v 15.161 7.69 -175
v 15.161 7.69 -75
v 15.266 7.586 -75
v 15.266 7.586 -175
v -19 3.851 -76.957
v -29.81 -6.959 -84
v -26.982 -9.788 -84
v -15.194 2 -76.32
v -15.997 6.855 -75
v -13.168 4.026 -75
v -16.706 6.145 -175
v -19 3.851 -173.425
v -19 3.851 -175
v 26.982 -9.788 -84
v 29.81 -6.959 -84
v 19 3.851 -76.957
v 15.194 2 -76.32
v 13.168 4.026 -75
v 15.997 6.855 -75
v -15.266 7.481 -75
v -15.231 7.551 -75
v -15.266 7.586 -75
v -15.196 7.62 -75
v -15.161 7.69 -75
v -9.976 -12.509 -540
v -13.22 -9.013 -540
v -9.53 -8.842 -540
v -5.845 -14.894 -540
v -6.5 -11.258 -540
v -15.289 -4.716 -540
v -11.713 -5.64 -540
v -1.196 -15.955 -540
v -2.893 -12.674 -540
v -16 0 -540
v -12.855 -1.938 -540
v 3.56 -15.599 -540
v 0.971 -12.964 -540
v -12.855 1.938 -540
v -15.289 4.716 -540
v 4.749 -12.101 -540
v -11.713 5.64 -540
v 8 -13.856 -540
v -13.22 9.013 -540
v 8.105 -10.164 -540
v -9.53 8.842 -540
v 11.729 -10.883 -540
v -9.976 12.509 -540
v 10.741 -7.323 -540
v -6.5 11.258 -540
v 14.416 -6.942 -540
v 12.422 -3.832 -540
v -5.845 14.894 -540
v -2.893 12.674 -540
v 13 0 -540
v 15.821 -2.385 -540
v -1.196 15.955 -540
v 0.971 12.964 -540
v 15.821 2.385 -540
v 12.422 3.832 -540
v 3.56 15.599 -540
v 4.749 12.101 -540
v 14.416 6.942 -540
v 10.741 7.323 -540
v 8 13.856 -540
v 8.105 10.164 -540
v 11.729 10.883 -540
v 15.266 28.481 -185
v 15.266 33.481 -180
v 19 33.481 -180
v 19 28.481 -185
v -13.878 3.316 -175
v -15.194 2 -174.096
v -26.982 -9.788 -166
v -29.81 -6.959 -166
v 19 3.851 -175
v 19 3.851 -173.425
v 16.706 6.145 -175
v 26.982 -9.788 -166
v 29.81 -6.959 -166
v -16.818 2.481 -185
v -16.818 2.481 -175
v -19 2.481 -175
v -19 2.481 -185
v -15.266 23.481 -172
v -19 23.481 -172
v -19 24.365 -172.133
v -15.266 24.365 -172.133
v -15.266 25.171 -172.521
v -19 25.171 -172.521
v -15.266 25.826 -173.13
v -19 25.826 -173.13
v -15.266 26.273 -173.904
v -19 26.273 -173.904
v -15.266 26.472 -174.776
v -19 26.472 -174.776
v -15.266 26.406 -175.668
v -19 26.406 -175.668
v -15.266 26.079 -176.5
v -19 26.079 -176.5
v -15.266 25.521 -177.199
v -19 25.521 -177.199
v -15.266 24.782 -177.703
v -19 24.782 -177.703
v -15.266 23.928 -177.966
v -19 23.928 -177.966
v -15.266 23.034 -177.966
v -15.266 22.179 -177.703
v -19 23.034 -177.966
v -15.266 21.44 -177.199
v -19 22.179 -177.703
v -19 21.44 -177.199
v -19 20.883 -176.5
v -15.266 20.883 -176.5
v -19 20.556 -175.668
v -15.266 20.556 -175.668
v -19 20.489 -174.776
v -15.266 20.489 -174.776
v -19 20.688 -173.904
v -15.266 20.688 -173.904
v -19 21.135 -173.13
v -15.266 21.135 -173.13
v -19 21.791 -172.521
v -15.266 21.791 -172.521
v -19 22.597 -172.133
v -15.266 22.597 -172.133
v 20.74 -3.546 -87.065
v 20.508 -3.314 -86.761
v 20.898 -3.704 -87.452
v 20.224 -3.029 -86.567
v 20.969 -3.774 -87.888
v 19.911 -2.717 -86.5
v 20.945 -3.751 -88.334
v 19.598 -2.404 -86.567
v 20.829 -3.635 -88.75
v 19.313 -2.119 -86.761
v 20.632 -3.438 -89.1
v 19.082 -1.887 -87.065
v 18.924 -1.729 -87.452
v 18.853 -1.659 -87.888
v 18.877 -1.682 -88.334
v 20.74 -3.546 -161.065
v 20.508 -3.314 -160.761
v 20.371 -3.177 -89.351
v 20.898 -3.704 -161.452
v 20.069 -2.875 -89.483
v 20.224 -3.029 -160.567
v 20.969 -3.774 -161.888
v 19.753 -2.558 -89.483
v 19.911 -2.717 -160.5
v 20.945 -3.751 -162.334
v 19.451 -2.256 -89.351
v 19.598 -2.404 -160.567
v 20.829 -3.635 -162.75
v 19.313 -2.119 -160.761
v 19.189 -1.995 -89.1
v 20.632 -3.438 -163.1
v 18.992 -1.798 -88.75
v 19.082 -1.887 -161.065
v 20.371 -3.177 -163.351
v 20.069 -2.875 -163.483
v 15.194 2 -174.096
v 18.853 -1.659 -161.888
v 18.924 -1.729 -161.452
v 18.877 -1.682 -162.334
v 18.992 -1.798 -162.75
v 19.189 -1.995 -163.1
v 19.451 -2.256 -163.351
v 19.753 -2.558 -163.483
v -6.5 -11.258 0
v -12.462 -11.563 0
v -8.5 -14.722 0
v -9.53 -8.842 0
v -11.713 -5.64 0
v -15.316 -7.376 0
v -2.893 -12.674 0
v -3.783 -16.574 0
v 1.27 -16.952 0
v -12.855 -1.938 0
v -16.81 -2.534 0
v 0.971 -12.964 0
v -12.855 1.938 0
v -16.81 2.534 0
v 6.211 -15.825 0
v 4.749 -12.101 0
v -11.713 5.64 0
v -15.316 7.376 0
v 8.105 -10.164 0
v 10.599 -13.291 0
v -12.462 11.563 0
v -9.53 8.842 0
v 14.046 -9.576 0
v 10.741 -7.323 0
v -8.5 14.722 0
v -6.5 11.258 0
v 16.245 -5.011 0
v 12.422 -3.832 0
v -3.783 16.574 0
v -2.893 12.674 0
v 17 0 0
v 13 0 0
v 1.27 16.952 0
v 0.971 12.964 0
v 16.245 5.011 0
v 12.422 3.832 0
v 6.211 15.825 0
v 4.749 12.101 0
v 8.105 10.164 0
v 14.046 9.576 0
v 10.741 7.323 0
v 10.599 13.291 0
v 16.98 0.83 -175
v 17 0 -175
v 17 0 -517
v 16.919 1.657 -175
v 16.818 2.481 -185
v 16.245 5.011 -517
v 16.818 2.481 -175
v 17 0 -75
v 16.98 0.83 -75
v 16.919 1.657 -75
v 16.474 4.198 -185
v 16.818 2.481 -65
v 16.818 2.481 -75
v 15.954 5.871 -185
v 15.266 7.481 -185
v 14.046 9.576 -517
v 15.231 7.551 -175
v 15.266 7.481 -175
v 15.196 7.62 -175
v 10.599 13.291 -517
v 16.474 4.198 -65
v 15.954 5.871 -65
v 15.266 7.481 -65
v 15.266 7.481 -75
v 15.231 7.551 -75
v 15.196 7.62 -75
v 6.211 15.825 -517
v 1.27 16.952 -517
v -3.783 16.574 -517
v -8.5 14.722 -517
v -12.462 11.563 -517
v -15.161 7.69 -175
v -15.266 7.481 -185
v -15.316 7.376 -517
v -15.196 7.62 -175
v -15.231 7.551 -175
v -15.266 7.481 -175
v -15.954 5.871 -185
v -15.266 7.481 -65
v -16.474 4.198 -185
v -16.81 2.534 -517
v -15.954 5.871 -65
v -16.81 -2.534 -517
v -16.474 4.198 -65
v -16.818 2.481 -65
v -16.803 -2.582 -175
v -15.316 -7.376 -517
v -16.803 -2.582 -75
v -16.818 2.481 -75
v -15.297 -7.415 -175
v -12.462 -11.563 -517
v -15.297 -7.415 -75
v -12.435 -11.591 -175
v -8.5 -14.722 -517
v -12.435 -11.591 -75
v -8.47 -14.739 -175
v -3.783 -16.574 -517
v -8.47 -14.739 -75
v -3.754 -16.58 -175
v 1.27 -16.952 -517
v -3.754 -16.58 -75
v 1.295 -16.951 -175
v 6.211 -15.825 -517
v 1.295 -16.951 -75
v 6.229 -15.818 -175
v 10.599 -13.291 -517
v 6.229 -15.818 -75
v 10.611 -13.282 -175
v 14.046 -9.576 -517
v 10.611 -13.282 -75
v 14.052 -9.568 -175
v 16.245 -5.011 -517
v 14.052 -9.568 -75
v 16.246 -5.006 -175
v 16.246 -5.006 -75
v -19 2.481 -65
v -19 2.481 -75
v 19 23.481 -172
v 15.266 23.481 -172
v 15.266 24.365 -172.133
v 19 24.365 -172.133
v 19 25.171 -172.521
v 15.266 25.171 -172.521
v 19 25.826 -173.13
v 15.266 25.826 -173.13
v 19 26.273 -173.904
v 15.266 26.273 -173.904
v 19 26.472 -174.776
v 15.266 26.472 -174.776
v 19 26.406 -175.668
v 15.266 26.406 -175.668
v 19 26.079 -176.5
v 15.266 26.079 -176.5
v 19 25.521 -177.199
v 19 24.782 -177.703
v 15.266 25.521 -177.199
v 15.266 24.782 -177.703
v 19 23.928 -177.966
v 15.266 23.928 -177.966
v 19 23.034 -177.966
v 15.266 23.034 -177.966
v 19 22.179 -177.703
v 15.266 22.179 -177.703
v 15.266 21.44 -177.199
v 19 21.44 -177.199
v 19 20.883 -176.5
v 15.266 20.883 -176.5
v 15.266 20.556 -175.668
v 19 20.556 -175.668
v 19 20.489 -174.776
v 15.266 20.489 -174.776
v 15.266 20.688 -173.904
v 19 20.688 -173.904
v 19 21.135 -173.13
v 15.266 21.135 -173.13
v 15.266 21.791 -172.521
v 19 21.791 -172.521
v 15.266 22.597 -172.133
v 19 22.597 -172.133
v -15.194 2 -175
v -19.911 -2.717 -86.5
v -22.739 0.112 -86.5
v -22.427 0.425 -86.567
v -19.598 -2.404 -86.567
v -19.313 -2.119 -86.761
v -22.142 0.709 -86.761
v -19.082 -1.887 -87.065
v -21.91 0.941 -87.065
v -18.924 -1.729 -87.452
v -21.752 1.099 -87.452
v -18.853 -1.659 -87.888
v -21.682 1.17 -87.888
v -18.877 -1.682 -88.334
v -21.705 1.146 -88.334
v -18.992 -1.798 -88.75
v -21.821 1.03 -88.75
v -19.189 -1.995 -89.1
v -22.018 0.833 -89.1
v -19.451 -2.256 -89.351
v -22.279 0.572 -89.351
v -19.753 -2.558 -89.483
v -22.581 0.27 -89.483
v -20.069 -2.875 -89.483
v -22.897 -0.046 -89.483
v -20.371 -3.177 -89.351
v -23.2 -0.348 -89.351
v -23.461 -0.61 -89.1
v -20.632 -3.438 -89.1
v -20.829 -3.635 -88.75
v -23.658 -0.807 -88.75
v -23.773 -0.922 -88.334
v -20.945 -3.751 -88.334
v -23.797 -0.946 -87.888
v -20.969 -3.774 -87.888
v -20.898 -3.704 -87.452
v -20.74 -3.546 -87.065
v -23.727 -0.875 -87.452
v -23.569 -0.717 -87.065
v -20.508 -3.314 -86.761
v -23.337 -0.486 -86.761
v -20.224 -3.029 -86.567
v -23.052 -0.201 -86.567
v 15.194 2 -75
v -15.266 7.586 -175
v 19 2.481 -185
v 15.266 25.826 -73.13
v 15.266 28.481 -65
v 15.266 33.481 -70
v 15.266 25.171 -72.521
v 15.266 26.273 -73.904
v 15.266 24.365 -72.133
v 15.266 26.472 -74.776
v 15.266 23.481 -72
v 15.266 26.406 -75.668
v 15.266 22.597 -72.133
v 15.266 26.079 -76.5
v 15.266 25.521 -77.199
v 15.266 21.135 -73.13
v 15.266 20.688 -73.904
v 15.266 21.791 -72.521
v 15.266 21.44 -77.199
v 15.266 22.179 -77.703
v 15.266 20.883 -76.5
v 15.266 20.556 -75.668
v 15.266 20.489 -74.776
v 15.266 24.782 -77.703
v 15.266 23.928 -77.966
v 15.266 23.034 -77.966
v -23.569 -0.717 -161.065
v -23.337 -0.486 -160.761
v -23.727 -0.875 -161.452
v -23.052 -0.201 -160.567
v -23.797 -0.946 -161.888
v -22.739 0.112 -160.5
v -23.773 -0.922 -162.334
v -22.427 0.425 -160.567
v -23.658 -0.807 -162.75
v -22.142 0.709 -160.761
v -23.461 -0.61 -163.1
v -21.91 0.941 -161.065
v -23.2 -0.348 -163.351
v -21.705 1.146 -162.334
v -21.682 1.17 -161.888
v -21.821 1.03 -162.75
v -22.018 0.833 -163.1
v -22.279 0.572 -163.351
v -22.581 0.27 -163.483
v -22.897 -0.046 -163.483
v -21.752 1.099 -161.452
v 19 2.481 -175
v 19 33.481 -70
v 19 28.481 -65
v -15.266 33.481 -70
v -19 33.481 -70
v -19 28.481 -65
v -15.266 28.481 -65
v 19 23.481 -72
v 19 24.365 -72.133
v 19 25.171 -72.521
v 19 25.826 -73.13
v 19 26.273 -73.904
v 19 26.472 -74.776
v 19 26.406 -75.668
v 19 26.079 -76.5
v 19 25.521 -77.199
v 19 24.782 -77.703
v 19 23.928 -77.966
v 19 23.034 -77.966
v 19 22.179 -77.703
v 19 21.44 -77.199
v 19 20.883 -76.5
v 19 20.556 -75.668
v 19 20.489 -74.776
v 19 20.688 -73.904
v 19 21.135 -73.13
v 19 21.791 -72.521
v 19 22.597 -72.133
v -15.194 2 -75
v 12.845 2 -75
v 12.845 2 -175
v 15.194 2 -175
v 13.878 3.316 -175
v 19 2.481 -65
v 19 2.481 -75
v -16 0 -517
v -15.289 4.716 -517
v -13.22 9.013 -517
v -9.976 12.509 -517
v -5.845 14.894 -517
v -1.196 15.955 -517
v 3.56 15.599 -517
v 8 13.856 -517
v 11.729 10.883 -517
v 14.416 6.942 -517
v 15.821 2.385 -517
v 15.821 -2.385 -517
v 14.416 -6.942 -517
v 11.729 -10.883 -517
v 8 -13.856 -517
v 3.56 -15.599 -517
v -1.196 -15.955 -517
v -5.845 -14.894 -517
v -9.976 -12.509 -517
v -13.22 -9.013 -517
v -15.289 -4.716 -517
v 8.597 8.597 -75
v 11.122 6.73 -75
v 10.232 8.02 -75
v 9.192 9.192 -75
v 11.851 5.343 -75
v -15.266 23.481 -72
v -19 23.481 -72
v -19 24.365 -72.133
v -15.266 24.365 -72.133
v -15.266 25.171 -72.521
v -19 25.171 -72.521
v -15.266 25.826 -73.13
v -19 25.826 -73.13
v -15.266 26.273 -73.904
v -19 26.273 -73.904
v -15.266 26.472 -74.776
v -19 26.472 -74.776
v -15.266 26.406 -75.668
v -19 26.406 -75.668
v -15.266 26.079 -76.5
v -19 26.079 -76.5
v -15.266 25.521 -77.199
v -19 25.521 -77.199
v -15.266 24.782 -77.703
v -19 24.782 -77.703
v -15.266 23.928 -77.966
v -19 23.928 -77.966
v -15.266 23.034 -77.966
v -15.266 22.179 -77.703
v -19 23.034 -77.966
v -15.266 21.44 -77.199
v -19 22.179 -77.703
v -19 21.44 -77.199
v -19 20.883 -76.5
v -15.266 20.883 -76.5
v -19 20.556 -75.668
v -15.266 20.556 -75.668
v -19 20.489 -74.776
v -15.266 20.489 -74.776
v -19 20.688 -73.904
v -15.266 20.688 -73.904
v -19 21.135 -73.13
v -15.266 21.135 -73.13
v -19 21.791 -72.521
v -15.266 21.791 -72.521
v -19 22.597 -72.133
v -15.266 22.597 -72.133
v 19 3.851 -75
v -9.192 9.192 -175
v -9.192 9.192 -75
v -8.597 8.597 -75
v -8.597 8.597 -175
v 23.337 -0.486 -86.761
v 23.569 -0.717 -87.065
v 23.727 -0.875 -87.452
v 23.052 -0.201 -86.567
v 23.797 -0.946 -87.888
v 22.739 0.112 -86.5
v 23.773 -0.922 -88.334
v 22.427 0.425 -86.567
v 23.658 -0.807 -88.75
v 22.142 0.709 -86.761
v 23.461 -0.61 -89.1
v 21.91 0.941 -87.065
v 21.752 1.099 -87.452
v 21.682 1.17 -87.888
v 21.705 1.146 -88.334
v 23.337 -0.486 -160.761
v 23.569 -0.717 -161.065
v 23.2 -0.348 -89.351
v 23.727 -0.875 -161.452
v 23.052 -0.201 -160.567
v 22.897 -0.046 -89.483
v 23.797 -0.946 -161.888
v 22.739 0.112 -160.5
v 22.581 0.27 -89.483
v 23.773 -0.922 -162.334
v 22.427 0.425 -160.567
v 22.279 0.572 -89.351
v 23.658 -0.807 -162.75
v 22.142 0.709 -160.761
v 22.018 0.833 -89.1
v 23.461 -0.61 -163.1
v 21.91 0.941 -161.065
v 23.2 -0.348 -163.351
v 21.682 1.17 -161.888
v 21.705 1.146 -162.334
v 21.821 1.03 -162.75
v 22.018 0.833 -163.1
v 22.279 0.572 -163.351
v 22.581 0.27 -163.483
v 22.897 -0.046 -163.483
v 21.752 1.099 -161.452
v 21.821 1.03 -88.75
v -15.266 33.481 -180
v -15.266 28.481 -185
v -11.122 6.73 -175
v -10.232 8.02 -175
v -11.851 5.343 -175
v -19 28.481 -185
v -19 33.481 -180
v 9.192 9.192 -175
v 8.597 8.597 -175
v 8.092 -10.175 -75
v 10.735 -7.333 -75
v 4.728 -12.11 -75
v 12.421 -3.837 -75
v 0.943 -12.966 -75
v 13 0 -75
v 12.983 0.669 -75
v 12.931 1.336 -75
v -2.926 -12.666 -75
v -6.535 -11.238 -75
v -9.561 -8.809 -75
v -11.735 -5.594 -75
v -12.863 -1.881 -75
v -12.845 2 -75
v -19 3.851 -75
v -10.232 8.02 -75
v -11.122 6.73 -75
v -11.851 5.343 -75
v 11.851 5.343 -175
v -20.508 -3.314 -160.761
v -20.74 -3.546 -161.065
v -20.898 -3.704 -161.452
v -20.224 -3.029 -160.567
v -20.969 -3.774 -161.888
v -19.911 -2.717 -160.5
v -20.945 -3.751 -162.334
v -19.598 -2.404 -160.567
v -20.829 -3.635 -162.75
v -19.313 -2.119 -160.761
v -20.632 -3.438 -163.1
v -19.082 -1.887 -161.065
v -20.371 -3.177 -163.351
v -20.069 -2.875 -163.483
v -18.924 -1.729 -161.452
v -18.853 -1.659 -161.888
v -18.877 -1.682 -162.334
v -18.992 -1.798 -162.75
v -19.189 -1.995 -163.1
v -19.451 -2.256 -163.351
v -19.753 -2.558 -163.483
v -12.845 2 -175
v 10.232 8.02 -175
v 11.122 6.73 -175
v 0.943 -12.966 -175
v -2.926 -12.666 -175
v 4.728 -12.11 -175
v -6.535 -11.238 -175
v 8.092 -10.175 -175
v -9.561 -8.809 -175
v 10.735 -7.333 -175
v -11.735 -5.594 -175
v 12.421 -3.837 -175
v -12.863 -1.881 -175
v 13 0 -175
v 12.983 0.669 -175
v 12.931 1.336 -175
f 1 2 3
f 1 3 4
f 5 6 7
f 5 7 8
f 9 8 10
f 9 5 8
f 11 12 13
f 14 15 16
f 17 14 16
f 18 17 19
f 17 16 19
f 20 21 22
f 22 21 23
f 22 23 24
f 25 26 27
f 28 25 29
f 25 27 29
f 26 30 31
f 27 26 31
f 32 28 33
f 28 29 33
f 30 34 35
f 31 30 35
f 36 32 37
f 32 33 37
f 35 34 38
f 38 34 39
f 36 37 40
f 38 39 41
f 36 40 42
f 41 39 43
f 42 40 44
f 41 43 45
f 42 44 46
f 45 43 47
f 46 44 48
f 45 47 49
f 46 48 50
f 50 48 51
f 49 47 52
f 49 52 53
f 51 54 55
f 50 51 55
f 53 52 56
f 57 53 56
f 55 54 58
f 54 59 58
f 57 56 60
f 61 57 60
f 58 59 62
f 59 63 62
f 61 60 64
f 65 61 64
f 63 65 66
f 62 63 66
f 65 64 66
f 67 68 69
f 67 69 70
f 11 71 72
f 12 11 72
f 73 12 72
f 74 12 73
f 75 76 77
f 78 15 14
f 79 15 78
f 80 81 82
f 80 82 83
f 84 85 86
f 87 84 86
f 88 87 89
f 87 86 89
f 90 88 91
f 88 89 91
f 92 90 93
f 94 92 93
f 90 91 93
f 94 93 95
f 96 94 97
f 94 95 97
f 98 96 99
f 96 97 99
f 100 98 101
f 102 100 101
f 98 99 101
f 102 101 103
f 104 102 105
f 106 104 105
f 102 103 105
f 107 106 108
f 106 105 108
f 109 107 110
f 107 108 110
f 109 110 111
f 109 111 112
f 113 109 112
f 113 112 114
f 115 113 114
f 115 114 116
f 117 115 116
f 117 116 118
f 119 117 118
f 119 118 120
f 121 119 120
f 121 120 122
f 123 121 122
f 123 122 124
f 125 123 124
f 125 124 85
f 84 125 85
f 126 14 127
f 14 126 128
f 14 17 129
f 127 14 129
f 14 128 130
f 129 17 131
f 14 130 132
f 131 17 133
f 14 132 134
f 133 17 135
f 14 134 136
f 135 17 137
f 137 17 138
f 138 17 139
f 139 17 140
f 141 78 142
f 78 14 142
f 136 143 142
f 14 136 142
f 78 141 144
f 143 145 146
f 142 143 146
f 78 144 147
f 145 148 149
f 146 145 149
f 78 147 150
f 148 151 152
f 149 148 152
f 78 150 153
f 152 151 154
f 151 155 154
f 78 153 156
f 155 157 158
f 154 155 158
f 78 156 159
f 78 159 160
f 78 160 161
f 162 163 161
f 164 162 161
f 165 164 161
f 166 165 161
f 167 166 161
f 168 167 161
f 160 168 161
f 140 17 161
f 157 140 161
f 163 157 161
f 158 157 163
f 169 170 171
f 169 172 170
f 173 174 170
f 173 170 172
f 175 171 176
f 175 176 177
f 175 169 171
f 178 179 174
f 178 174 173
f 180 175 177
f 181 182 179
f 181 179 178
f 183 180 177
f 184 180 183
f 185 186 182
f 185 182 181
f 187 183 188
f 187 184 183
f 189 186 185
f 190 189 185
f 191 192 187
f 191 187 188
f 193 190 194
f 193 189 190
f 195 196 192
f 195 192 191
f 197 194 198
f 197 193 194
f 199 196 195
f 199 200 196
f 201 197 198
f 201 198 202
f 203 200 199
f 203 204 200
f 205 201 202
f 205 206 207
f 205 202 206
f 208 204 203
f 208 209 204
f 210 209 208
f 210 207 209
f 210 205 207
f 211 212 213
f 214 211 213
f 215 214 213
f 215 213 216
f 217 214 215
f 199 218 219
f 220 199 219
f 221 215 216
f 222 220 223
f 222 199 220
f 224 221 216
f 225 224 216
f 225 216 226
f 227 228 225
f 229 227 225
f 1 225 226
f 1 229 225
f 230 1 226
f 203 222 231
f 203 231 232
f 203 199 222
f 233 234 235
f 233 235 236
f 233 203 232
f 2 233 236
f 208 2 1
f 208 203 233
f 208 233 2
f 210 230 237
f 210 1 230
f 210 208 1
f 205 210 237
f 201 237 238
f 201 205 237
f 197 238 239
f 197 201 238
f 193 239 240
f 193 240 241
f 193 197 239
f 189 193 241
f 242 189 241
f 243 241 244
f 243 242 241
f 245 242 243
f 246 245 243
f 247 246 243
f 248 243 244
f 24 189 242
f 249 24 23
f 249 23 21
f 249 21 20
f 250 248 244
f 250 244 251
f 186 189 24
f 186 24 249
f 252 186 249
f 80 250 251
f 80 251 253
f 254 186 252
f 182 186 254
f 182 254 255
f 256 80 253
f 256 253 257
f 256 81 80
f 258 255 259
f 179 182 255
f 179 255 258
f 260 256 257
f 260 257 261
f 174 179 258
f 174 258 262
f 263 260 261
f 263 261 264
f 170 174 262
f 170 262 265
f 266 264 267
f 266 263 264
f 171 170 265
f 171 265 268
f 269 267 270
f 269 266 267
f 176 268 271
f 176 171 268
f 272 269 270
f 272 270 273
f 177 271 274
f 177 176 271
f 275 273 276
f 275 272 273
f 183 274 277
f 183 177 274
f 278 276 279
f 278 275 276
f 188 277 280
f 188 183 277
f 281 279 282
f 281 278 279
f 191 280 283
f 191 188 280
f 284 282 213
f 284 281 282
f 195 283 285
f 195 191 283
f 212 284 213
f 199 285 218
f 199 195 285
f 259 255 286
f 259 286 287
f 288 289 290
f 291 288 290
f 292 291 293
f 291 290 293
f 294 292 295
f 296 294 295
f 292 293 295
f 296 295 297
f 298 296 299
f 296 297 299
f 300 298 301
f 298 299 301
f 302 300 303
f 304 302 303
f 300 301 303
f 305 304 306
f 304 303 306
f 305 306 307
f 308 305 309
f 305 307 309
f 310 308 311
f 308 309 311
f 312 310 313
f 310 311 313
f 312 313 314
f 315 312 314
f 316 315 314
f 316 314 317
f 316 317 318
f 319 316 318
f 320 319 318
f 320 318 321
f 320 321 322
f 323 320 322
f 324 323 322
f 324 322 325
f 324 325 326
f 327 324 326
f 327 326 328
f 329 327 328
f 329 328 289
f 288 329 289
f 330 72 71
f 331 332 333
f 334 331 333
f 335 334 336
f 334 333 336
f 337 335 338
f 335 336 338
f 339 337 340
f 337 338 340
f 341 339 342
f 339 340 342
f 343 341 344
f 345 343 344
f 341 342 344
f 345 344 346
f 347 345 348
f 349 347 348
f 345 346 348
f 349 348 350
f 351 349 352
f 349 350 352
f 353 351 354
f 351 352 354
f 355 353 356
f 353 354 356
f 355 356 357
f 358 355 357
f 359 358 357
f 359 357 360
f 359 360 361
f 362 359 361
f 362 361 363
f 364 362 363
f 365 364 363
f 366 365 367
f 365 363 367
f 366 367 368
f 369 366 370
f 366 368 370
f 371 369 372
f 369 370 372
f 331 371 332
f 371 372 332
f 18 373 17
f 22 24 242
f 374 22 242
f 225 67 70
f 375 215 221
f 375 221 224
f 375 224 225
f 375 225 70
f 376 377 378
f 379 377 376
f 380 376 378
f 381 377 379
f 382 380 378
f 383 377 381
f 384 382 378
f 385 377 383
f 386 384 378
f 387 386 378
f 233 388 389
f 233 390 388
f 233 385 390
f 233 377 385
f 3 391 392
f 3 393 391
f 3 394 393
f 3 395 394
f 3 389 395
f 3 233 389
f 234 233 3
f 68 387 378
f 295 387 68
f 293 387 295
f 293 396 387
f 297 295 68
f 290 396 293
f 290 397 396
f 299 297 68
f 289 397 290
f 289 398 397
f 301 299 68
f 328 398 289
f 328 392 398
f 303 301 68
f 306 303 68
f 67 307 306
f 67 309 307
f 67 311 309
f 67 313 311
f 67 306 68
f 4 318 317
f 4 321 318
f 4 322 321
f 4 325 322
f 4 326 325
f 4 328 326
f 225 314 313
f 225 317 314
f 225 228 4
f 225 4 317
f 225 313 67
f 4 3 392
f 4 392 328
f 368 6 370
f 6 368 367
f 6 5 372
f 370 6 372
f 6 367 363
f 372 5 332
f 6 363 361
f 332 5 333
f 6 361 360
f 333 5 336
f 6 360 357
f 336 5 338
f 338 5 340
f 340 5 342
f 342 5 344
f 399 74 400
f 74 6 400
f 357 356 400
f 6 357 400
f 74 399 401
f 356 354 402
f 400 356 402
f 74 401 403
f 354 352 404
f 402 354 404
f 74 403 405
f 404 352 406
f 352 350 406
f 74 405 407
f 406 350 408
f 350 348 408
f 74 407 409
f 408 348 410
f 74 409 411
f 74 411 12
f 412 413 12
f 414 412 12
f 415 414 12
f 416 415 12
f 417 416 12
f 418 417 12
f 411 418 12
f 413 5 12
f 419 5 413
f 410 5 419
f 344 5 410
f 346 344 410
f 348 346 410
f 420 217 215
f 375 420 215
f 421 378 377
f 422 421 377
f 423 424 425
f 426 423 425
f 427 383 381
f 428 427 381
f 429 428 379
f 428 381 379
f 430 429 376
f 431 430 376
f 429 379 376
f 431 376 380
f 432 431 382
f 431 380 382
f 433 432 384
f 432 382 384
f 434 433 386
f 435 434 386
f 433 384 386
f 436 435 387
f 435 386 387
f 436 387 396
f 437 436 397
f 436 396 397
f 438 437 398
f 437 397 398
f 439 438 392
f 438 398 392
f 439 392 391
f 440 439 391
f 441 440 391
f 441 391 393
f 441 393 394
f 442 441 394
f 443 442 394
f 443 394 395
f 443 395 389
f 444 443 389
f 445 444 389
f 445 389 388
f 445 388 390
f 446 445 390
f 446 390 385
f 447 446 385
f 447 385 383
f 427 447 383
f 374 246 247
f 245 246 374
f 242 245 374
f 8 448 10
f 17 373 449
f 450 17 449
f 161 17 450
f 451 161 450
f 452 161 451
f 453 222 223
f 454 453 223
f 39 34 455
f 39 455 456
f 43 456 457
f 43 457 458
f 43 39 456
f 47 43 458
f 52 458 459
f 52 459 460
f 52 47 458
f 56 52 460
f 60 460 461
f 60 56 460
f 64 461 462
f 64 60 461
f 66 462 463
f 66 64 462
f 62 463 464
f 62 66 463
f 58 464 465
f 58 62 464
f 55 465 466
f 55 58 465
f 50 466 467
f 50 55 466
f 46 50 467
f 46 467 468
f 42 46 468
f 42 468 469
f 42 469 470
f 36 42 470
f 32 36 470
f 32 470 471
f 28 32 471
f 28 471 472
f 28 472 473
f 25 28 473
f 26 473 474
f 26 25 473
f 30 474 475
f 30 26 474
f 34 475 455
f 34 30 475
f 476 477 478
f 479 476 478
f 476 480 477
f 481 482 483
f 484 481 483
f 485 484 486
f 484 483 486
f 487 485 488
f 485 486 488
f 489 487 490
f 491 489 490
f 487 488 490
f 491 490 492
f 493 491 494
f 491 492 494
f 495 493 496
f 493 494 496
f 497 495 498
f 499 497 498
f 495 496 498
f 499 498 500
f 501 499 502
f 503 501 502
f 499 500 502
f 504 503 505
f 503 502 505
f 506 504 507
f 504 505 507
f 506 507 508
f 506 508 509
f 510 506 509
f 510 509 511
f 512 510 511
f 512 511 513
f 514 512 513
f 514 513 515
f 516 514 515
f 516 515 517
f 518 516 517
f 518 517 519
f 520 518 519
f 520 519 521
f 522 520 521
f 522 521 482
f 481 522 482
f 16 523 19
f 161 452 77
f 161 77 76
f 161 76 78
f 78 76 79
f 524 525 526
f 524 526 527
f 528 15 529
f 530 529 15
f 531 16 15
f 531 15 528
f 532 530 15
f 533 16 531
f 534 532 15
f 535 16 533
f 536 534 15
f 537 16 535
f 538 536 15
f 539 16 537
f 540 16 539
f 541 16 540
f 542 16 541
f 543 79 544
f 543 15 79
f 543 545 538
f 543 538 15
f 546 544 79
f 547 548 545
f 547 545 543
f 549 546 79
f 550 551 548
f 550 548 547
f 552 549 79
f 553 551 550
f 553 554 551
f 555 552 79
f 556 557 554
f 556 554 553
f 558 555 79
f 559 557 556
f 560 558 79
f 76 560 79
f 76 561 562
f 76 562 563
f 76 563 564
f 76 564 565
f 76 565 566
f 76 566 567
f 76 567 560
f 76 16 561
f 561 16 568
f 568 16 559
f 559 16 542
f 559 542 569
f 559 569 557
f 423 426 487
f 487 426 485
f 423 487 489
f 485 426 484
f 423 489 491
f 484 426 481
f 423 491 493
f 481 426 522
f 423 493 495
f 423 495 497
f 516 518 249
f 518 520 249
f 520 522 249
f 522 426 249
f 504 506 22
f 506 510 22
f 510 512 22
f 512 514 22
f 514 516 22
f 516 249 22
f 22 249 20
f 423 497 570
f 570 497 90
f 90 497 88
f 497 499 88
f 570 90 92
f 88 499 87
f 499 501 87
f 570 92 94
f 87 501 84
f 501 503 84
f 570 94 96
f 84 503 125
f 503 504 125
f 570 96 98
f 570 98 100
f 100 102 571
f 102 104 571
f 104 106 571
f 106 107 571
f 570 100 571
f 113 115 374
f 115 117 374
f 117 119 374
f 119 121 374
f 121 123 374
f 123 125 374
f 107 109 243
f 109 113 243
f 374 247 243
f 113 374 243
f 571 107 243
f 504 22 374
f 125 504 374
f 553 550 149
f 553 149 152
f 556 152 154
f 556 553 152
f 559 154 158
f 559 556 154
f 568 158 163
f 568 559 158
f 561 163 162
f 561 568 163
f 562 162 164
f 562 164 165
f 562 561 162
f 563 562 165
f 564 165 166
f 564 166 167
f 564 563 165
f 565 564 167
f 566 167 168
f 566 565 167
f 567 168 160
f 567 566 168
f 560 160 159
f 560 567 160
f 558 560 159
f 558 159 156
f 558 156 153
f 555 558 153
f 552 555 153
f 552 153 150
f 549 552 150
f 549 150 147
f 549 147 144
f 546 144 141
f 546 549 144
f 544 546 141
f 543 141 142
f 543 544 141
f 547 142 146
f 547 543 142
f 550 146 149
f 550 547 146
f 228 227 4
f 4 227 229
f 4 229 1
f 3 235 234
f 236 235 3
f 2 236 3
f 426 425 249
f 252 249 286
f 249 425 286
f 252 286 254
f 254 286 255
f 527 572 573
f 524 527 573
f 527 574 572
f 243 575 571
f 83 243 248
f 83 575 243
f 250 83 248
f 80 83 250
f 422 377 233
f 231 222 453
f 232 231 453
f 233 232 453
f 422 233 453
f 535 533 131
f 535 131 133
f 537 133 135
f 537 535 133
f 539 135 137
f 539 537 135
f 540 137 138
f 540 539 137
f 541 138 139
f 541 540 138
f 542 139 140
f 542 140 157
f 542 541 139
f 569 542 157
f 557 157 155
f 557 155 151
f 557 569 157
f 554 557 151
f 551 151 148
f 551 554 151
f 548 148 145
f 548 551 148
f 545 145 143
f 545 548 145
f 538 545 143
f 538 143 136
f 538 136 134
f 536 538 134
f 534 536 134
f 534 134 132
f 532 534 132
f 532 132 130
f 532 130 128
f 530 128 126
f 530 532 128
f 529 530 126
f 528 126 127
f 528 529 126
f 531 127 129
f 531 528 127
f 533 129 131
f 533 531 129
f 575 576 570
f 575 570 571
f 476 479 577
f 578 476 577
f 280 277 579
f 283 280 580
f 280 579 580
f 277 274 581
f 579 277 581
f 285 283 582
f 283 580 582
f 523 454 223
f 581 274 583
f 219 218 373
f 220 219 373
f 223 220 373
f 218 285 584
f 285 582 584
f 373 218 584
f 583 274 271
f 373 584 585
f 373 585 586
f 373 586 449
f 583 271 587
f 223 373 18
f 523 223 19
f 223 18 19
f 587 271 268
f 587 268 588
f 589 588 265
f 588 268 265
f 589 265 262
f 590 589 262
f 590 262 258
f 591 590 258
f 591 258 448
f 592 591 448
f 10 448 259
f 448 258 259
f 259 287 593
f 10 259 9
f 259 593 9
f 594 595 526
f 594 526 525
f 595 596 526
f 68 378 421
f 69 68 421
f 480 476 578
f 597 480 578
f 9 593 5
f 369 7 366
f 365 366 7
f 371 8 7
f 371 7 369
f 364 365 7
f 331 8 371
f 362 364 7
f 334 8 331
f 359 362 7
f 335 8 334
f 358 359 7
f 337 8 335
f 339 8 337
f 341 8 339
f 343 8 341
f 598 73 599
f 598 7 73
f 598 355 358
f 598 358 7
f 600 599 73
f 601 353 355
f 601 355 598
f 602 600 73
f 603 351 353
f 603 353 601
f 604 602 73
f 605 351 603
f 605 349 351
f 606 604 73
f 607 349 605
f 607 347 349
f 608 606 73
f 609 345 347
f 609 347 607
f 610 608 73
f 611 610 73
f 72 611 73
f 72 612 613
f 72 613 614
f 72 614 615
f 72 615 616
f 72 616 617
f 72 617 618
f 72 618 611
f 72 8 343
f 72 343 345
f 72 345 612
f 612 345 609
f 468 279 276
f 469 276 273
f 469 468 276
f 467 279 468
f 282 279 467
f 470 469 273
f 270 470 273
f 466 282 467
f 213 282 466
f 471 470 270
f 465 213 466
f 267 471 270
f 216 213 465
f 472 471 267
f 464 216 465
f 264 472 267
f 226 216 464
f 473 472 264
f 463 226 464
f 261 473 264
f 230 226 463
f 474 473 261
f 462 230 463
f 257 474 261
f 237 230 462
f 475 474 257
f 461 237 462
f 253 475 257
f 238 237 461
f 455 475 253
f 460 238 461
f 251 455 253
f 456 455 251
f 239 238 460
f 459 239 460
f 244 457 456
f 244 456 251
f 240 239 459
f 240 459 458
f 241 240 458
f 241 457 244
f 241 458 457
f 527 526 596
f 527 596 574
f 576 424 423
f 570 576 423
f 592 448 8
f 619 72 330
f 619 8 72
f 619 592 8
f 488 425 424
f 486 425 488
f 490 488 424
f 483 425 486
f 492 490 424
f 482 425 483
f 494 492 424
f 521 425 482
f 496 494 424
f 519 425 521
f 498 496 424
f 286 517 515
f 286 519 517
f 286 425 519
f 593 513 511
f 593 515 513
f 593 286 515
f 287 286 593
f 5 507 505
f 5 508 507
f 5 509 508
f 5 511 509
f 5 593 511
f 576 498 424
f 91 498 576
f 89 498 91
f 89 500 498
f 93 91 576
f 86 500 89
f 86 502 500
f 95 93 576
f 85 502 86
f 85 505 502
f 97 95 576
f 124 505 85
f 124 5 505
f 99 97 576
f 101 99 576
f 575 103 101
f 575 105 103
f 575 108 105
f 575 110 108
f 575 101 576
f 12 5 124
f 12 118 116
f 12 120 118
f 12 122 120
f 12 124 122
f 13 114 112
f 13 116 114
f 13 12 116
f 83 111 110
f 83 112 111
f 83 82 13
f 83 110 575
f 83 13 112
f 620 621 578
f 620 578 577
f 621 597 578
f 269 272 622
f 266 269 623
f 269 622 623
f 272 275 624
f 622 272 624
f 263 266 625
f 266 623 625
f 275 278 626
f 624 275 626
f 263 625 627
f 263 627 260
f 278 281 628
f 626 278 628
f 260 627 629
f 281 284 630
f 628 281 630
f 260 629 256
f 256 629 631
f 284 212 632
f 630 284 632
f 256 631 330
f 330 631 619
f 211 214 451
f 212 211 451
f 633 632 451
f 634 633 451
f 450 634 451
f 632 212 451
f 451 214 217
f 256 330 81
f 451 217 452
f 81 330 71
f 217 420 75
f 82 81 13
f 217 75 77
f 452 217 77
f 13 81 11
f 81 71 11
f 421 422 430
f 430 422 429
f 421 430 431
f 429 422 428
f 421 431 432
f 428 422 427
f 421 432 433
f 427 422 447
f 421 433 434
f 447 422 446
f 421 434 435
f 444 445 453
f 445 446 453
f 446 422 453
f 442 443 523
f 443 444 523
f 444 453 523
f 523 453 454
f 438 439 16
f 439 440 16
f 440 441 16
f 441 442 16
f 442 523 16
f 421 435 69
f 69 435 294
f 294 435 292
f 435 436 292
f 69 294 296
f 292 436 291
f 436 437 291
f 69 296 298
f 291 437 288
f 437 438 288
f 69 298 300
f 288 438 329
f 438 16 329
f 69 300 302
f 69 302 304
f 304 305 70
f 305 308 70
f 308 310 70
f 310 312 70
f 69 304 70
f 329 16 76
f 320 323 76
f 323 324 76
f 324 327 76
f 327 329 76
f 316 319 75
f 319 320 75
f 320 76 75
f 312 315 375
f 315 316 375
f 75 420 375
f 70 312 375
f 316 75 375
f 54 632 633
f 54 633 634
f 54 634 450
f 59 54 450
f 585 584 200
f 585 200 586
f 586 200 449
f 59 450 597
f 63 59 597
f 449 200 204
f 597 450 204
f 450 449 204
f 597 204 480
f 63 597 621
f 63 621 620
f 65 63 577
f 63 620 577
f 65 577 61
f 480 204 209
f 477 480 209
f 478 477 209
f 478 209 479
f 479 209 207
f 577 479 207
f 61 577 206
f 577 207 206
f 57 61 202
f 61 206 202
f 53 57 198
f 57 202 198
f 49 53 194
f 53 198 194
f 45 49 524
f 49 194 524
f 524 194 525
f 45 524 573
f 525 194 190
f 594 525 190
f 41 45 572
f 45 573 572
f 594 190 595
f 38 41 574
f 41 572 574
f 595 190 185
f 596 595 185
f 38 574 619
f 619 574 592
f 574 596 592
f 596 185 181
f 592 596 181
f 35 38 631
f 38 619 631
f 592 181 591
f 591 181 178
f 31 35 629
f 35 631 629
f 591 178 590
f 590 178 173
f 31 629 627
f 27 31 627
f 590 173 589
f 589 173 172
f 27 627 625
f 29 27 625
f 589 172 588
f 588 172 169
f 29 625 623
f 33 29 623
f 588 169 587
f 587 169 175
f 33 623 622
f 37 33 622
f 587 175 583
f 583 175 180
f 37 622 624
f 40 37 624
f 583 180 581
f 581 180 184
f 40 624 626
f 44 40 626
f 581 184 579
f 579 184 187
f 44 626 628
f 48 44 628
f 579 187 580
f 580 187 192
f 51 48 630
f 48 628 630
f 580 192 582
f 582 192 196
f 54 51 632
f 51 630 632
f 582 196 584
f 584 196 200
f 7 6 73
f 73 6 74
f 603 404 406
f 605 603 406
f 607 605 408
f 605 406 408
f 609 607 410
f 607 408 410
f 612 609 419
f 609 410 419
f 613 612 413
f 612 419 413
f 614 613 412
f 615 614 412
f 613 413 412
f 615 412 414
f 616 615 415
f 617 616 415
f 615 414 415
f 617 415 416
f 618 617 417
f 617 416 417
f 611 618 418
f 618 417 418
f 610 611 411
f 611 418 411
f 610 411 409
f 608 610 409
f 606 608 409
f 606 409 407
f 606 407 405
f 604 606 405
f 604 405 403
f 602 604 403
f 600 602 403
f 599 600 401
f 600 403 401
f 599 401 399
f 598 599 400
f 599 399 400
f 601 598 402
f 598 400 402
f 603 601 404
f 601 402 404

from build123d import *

# Parameters (mm, degrees)
SKETCH1_R                              = 17
OUTER_BARREL_CREATION_DEPTH            = 540
SKETCH4_W                              = 100
SKETCH4_H                              = 19
SCREW_INTAKE_EXTRUDE_DEPTH             = 18
SCREW_INTAKE_EXTRUDE_DEPTH_BACK        = 18
SKETCH6_W                              = 120
SKETCH6_H                              = 5
PARALLEL_FIN_SIDE_EXTRUSION_DEPTH      = 19
PARALLEL_FIN_SIDE_EXTRUSION_DEPTH_BACK = 19
SKETCH7_W                              = 3.734431396
SKETCH7_H                              = 120
PARALLEL_FIN_HEIGHT_SIDE_1_DEPTH       = 26
SKETCH8_W                              = 3.734431396
SKETCH8_H                              = 120
PARALLEL_FIN_HEIGHT_SIDE_2_DEPTH       = 26
SKETCH9_R                              = 3
PARALLEL_FIN_DETAILS_DEPTH             = 39
SKETCH2_R                              = 13
INNER_BARREL_EXTRUSION_DEPTH           = 541
SKETCH11_W                             = 100
SKETCH11_H                             = 4
BOSS_EXTRUDE6_DEPTH                    = 26
SKETCH12_R                             = 1.5
CUT_EXTRUDE5_DEPTH                     = 4
SKETCH13_R                             = 27.099065824
SKETCH13_R_2                           = 16
CUT_EXTRUDE8_DEPTH                     = 23


with BuildPart() as part:
    # Sketch1 → Outer Barrel Creation (new body)
    with BuildSketch(Plane.XY):
        Circle(SKETCH1_R)
    extrude(amount=-OUTER_BARREL_CREATION_DEPTH)

    # Sketch4 → Screw Intake Extrude (cut, two sides)
    with BuildSketch(Plane(origin=(0, 0, 0), x_dir=(0, 0, -1), z_dir=(1, 0, 0))) as screw_intake_extrude_sk:
        with Locations((125, -7.5)):
            Rectangle(SKETCH4_W, SKETCH4_H)
    extrude(amount=SCREW_INTAKE_EXTRUDE_DEPTH, mode=Mode.SUBTRACT)
    extrude(screw_intake_extrude_sk.sketch, amount=-SCREW_INTAKE_EXTRUDE_DEPTH_BACK, mode=Mode.SUBTRACT)

    # Sketch6 → Parallel Fin Side Extrusion (add, two sides)
    with BuildSketch(Plane(origin=(0, 0, 0), x_dir=(0, 0, -1), z_dir=(1, 0, 0))) as parallel_fin_side_extrusion_sk:
        with Locations((125, 4.980803112)):
            Rectangle(SKETCH6_W, SKETCH6_H)
    extrude(amount=PARALLEL_FIN_SIDE_EXTRUSION_DEPTH)
    extrude(parallel_fin_side_extrusion_sk.sketch, amount=-PARALLEL_FIN_SIDE_EXTRUSION_DEPTH_BACK)

    # Sketch7 → Parallel Fin Height Side 1 (add)
    with BuildSketch(Plane(origin=(0, 7.480803112, 0), x_dir=(1, 0, 0), z_dir=(0, 1, 0))):
        with Locations((17.132784302, 125)):
            Rectangle(SKETCH7_W, SKETCH7_H)
    extrude(amount=PARALLEL_FIN_HEIGHT_SIDE_1_DEPTH)

    # Sketch8 → Parallel Fin Height Side 2 (add)
    with BuildSketch(Plane(origin=(0, 7.480803112, 0), x_dir=(1, 0, 0), z_dir=(0, 1, 0))):
        with Locations((-17.132784302, 125)):
            Rectangle(SKETCH8_W, SKETCH8_H)
    extrude(amount=PARALLEL_FIN_HEIGHT_SIDE_2_DEPTH)

    # Sketch9 → Parallel Fin Details (cut, through all)
    with BuildSketch(Plane.ZY.offset(19)):
        with Locations((-175, 23.480803112)):
            Circle(SKETCH9_R)
        with Locations((-75, 23.480803112)):
            Circle(SKETCH9_R)
        Polygon((-180, 33.480803112), (-185, 28.480803112), (-185, 33.480803112), align=None)
        Polygon((-70, 33.480803112), (-65, 28.480803112), (-65, 33.480803112), align=None)
    extrude(amount=-PARALLEL_FIN_DETAILS_DEPTH, mode=Mode.SUBTRACT)

    # Sketch2 → Inner Barrel Extrusion (cut, through all)
    with BuildSketch(Plane.XY):
        Circle(SKETCH2_R)
    extrude(amount=-INNER_BARREL_EXTRUSION_DEPTH, mode=Mode.SUBTRACT)

    # Sketch11 → Boss-Extrude6 (add)
    with BuildSketch(Plane(origin=(0, 0, 0), x_dir=(0, 0, -1), z_dir=(0.707106781, 0.707106781, 0))):
        with Locations((125, 14.15826017)):
            Rectangle(SKETCH11_W, SKETCH11_H)
    boss_extrude6 = extrude(amount=-BOSS_EXTRUDE6_DEPTH)

    # Sketch12 → Cut-Extrude5 (cut)
    with BuildSketch(Plane(origin=(-11.425615339, 11.425615339, 0), x_dir=(0, 0, 1), z_dir=(-0.707106781, 0.707106781, 0))):
        with Locations((-162, -16)):
            Circle(SKETCH12_R)
        with Locations((-88, -16)):
            Circle(SKETCH12_R)
        Polygon((-175, -7.468207578), (-166, -26), (-175, -26), align=None)
        Polygon((-75, -6.46439117), (-75, -26), (-84, -26), align=None)
    cut_extrude5 = extrude(amount=-CUT_EXTRUDE5_DEPTH, mode=Mode.SUBTRACT)

    # Mirror2: Boss-Extrude6, Cut-Extrude5 across plane
    add(boss_extrude6.mirror(Plane(origin=(0, 0, 0), x_dir=(0, 0, 1), z_dir=(1, 0, 0))))
    add(cut_extrude5.mirror(Plane(origin=(0, 0, 0), x_dir=(0, 0, 1), z_dir=(1, 0, 0))), mode=Mode.SUBTRACT)

    # Sketch13 → Cut-Extrude8 (cut)
    with BuildSketch(Plane(origin=(0, 0, -540), x_dir=(-1, 0, 0), z_dir=(0, 0, -1))):
        Circle(SKETCH13_R)
        Circle(SKETCH13_R_2, mode=Mode.SUBTRACT)
    extrude(amount=-CUT_EXTRUDE8_DEPTH, mode=Mode.SUBTRACT)


solid = part.part
